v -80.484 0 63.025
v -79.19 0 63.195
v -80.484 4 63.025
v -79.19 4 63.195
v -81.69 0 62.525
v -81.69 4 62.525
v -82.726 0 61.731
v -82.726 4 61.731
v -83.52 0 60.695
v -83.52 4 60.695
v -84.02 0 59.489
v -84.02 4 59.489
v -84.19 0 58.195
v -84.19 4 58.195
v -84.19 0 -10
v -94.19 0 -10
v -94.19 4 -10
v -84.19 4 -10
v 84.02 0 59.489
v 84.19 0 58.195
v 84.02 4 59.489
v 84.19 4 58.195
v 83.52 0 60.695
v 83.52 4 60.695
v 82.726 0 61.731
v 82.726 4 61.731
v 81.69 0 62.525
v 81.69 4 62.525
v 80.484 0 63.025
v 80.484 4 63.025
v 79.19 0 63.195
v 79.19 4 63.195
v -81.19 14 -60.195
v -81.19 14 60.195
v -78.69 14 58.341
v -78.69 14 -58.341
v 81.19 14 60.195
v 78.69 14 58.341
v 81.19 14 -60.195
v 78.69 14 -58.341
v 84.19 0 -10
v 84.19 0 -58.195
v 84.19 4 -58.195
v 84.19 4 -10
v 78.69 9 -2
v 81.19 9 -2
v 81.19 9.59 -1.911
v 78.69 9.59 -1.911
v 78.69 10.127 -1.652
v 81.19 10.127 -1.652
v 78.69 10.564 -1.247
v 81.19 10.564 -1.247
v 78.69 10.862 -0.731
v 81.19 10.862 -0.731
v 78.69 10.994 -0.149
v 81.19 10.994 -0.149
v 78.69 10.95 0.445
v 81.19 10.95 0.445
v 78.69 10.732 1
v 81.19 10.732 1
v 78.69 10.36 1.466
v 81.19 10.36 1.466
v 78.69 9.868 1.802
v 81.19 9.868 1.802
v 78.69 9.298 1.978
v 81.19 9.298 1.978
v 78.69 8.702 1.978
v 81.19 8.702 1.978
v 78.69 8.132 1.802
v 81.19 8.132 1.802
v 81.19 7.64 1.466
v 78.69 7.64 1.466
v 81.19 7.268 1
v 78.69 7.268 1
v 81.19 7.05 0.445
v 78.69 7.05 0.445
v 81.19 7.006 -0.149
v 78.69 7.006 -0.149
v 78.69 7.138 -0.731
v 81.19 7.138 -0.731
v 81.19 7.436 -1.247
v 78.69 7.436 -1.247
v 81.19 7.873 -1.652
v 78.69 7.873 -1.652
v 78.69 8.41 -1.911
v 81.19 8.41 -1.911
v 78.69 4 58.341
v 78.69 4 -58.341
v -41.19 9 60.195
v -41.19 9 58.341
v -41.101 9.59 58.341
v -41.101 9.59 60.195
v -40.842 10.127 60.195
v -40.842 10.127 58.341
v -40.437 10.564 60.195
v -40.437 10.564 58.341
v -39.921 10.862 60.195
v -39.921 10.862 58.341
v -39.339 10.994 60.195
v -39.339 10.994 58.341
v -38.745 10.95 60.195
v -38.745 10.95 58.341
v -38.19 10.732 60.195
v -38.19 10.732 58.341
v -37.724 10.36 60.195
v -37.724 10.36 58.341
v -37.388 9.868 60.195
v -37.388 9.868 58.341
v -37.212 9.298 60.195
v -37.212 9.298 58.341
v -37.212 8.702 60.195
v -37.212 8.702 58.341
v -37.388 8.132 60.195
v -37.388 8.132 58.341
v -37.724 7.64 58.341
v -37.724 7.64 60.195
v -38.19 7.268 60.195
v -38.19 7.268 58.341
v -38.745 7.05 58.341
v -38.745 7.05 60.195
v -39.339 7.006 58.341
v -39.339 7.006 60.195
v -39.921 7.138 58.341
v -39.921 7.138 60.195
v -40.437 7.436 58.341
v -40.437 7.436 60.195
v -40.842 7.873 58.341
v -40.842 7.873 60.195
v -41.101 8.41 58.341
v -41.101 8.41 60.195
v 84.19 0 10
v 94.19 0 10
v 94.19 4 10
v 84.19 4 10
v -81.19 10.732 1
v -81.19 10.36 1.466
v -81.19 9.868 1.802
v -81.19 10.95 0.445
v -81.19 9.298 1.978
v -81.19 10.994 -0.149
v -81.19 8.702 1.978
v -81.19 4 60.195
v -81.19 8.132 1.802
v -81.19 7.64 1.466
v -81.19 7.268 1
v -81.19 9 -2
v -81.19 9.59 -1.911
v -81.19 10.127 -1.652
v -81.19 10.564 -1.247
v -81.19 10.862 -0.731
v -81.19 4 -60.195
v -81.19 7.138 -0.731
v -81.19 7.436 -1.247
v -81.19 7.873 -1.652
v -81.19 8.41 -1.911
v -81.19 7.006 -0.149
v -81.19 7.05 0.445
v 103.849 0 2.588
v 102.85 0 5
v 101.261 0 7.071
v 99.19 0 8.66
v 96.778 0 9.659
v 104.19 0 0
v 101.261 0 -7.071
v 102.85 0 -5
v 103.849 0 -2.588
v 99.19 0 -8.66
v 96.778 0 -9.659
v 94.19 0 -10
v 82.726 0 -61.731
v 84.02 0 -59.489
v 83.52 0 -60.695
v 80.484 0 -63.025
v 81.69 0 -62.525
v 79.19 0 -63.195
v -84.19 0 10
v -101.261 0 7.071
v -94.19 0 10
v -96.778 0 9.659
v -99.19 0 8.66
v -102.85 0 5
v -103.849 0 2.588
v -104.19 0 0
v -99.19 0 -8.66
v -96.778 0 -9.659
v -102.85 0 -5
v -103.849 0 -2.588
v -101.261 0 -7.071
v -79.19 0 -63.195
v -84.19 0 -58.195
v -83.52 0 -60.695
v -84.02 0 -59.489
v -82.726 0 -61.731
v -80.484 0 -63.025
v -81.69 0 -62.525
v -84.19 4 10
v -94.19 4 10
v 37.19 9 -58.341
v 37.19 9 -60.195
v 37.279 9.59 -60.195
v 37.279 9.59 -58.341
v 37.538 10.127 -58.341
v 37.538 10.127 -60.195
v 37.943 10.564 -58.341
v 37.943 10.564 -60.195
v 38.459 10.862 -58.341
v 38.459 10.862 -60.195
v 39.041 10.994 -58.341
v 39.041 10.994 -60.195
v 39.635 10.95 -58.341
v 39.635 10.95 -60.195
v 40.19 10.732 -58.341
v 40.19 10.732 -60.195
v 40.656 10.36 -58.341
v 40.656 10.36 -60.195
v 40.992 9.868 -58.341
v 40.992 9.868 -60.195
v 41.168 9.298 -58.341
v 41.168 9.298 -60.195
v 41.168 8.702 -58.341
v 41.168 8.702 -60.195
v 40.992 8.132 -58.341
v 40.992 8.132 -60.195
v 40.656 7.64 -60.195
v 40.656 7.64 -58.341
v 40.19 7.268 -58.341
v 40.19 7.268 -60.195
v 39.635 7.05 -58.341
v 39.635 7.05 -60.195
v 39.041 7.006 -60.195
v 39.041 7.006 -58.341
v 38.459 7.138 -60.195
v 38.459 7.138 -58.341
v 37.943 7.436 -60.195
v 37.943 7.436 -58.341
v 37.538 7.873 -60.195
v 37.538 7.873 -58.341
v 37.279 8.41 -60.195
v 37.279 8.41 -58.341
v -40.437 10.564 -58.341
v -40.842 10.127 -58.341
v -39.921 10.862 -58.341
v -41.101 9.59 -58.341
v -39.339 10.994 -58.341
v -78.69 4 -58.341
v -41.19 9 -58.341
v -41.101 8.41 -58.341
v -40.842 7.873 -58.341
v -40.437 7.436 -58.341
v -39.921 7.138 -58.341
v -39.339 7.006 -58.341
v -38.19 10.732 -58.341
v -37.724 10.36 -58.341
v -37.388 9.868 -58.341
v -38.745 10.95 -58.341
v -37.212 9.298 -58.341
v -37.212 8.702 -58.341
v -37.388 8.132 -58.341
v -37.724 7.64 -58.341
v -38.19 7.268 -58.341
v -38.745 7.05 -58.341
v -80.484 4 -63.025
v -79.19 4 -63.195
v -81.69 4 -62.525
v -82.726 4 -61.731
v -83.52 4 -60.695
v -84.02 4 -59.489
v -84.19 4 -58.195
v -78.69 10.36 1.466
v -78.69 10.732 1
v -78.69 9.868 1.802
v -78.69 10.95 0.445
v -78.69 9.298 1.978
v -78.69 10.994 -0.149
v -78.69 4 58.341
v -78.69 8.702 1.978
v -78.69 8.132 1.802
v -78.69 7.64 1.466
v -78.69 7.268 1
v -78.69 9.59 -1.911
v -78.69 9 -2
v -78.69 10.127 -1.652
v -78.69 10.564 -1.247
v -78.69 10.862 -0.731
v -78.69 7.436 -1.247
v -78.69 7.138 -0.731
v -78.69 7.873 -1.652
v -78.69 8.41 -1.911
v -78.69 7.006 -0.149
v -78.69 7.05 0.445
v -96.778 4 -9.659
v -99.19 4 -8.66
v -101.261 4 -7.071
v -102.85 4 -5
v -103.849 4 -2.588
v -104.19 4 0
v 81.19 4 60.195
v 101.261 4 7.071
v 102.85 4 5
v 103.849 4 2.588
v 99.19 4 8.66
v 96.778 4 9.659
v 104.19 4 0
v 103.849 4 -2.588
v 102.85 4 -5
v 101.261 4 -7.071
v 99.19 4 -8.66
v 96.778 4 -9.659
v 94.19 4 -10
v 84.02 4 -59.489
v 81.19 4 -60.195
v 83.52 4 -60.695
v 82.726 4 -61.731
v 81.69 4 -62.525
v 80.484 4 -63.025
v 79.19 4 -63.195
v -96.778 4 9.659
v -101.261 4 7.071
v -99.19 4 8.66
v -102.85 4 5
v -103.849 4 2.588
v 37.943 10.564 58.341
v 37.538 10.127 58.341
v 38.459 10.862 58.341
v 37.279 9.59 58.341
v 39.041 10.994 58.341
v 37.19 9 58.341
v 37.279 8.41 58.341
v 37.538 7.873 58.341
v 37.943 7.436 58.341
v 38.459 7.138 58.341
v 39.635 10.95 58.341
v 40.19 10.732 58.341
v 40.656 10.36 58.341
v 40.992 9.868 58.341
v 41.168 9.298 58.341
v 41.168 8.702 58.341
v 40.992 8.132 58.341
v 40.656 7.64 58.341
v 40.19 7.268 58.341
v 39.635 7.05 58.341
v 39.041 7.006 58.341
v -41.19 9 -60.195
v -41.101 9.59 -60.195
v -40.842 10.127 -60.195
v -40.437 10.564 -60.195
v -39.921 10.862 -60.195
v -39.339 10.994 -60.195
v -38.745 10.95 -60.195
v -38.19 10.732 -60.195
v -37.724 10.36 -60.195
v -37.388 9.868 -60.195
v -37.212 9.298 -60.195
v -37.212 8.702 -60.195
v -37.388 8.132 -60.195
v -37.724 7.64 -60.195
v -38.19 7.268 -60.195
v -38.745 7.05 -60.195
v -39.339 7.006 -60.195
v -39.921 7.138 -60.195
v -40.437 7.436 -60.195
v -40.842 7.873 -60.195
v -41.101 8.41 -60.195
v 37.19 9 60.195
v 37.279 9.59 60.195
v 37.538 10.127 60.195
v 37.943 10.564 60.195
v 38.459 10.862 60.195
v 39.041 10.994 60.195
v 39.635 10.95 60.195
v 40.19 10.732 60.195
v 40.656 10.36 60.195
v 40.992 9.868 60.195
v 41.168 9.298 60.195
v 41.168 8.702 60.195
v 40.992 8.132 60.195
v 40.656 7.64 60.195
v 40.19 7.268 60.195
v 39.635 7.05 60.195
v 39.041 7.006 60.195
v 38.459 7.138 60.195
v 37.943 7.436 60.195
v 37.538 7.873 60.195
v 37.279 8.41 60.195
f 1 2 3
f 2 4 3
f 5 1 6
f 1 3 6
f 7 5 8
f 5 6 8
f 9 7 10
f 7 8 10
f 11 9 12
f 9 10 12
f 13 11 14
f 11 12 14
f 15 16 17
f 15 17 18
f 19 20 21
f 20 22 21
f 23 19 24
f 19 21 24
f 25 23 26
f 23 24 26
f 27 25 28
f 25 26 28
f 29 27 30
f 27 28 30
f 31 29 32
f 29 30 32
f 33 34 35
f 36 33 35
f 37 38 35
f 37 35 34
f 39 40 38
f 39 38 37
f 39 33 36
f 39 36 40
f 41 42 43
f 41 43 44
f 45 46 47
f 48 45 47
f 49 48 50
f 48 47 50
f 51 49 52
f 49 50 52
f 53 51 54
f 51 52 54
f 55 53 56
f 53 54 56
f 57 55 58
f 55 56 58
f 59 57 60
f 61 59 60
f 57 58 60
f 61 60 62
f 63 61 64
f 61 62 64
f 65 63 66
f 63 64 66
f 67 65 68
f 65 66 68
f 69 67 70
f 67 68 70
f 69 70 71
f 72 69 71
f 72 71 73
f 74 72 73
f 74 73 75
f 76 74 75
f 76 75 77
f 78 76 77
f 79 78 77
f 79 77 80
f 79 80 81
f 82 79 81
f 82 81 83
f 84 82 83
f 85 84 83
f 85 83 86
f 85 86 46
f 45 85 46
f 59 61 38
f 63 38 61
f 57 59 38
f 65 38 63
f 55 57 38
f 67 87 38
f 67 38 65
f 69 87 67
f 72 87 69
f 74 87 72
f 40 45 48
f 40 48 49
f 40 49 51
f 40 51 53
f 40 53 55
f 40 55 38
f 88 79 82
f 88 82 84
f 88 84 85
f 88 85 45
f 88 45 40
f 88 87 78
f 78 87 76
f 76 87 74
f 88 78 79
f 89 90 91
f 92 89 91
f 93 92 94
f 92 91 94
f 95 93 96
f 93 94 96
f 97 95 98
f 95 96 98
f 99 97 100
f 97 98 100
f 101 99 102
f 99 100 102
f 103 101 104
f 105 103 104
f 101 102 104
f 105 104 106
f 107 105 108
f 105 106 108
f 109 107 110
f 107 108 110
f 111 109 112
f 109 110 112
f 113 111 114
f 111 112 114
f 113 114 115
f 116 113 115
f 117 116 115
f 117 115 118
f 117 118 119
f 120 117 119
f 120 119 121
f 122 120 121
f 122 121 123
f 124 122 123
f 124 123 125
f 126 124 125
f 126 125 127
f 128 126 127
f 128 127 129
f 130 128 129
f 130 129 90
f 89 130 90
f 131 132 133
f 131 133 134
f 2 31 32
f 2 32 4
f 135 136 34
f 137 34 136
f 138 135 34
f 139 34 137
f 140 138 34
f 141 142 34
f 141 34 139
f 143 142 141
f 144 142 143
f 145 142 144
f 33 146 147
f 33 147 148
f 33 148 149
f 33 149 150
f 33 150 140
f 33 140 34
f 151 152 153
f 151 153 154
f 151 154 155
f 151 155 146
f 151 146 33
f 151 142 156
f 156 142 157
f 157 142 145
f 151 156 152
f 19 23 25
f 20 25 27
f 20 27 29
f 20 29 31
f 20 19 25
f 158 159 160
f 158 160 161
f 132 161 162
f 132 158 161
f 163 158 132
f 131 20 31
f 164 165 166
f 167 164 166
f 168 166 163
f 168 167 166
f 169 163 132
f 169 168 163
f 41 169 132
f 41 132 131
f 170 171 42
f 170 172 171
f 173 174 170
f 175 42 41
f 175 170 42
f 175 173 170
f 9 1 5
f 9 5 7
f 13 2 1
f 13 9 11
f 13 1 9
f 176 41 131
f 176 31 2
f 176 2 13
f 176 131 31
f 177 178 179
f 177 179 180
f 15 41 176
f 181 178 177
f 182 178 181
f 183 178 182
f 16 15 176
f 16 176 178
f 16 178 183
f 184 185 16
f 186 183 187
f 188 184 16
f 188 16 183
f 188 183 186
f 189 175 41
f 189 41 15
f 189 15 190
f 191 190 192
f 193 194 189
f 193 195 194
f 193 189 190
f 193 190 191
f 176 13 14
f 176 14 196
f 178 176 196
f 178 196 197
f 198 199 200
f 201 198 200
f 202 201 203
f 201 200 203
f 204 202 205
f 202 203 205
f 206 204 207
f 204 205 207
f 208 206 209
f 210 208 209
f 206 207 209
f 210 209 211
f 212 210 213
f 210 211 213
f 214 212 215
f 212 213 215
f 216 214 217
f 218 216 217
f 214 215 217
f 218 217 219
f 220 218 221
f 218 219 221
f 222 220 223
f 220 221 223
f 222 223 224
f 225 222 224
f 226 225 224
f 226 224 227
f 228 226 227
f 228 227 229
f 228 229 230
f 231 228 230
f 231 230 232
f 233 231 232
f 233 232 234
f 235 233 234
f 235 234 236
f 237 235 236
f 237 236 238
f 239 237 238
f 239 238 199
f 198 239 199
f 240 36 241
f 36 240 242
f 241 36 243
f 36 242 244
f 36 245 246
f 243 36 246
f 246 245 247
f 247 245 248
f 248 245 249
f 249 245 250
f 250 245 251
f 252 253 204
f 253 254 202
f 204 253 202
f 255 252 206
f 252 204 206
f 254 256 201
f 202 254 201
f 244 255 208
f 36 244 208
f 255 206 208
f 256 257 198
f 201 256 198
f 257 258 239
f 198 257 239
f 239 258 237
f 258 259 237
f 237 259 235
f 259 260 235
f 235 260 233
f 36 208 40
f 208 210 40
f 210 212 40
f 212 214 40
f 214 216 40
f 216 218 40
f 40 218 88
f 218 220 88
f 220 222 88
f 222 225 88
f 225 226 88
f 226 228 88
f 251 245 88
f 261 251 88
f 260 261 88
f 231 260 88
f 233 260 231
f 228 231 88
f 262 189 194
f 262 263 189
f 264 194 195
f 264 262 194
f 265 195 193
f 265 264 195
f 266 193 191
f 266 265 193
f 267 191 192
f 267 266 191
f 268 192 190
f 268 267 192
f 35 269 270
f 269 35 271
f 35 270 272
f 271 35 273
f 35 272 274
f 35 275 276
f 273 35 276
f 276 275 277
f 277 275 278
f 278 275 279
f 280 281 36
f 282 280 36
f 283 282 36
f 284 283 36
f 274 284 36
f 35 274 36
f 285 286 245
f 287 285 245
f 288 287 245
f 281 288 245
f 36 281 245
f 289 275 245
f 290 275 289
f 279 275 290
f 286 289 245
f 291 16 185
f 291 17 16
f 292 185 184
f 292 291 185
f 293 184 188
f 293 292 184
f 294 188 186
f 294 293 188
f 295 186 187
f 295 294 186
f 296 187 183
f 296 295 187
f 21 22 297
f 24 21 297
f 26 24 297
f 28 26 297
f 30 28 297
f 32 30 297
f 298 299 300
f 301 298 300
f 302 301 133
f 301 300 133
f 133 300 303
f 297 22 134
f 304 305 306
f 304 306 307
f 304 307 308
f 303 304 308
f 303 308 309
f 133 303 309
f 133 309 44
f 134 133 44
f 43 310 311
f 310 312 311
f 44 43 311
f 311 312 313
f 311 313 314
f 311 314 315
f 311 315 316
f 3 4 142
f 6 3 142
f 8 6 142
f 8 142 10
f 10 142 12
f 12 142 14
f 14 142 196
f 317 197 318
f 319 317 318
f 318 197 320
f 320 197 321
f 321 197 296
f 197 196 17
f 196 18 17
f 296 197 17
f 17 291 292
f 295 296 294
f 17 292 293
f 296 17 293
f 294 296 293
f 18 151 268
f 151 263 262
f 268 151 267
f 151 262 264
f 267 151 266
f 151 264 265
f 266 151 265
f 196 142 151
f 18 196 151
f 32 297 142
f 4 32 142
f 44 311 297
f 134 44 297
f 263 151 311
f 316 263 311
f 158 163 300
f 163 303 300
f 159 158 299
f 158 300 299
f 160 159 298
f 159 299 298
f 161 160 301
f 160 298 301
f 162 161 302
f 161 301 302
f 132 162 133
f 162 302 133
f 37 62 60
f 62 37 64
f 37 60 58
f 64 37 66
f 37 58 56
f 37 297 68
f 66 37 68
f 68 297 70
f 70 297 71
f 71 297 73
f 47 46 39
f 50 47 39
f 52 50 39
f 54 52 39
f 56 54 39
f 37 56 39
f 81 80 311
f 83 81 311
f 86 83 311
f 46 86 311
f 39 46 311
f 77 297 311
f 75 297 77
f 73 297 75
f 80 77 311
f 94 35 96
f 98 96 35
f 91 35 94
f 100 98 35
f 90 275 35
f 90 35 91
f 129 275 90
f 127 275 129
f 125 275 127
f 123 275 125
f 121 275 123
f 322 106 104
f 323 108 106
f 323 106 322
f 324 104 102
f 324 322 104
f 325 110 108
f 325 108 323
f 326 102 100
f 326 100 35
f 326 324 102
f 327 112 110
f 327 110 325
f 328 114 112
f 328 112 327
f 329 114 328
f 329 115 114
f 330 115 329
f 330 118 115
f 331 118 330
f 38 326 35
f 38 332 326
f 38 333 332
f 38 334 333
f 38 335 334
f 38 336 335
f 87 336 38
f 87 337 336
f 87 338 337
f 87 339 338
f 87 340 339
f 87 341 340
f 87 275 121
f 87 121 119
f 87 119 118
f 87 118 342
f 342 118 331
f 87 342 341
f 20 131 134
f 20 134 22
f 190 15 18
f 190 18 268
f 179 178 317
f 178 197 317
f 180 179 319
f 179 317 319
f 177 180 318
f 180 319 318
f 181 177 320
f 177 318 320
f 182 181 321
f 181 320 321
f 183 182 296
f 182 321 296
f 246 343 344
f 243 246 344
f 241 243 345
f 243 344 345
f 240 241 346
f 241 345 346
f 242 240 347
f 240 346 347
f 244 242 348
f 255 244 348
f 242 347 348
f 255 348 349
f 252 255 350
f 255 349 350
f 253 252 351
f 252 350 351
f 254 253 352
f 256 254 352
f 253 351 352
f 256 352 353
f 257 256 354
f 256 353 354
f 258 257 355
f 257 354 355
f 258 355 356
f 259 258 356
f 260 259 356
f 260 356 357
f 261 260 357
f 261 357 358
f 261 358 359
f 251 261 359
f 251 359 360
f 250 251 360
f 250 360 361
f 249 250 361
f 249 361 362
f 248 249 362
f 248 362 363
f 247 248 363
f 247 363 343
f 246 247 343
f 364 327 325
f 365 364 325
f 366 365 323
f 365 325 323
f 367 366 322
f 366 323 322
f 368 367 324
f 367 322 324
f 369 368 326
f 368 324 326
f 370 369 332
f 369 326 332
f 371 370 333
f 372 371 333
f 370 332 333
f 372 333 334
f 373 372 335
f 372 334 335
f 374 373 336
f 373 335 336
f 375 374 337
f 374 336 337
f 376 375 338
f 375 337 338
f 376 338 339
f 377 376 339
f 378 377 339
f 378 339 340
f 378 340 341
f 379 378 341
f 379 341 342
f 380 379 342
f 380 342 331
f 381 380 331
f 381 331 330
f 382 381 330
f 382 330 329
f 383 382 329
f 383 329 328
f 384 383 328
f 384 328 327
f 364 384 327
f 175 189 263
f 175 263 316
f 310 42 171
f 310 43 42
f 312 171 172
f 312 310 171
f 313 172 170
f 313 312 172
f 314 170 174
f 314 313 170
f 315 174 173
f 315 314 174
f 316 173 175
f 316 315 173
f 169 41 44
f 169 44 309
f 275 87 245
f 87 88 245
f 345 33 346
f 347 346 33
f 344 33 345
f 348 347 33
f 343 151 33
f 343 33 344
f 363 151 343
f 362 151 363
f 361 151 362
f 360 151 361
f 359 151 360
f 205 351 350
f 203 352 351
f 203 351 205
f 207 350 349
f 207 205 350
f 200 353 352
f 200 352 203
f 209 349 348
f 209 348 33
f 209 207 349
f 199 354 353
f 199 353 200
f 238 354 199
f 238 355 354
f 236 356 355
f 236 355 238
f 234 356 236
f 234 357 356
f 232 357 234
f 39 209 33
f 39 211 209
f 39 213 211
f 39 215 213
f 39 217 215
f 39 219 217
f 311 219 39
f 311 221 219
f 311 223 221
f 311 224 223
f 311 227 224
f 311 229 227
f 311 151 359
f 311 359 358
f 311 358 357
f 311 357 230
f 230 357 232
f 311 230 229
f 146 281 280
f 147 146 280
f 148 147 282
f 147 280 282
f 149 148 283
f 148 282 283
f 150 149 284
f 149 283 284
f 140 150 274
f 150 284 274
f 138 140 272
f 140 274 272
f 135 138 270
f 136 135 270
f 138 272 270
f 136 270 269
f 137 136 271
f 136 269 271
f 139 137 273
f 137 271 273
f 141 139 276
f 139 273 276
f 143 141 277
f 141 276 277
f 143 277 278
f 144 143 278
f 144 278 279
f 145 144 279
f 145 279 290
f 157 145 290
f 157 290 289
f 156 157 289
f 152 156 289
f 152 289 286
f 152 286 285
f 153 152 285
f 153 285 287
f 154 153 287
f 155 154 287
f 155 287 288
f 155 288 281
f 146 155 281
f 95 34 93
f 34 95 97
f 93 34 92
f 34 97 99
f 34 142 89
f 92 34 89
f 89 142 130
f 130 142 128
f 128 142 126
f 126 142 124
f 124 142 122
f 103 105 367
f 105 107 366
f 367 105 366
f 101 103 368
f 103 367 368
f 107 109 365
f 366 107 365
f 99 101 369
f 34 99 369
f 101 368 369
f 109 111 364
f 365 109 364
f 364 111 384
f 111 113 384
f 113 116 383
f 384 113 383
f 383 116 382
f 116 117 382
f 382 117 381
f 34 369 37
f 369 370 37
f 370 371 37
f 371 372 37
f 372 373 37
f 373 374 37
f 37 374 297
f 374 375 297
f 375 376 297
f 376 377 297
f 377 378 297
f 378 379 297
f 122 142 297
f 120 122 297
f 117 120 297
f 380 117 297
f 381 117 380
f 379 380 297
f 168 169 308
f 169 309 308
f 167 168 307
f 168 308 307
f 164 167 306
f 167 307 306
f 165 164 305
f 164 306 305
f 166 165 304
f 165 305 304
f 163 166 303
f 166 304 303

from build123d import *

# Parameters (mm, degrees)
BOSS_EXTRUDE1_DEPTH = 4
SKETCH2_W           = 162.38
SKETCH2_H           = 120.39
SKETCH2_W_2         = 157.38
SKETCH2_H_2         = 116.682954798
BOSS_EXTRUDE2_DEPTH = 10
FILLET1_R           = 10
FILLET2_R           = 5
SKETCH3_R           = 2
CUT_EXTRUDE1_DEPTH  = 182
SKETCH4_R           = 2
CUT_EXTRUDE2_DEPTH  = 182


with BuildPart() as part:
    # Sketch1 → Boss-Extrude1 (new body)
    with BuildSketch(Plane(origin=(0, 0, 0), x_dir=(1, 0, 0), z_dir=(0, 1, 0))):
        Polygon((-84.19, 63.195), (84.19, 63.195), (84.19, 10), (104.19, 10), (104.19, -10), (84.19, -10), (84.19, -63.195), (-84.19, -63.195), (-84.19, -10), (-104.19, -10), (-104.19, 10), (-84.19, 10), align=None)
    extrude(amount=BOSS_EXTRUDE1_DEPTH)

    # Sketch2 → Boss-Extrude2 (add)
    with BuildSketch(Plane(origin=(0, 4, 0), x_dir=(1, 0, 0), z_dir=(0, 1, 0))):
        Rectangle(SKETCH2_W, SKETCH2_H)
        Rectangle(SKETCH2_W_2, SKETCH2_H_2, mode=Mode.SUBTRACT)
    extrude(amount=BOSS_EXTRUDE2_DEPTH)

    # Fillet1
    fillet1_edges = [part.edges().sort_by_distance(p)[0] for p in [
        (104.19, 2, -10),
        (104.19, 2, 10),
        (-104.19, 2, -10),
        (-104.19, 2, 10),
    ]]
    fillet(fillet1_edges, radius=FILLET1_R - 0.0001)  # a hair under: the kernel refuses the full size

    # Fillet2
    fillet2_edges = [part.edges().sort_by_distance(p)[0] for p in [
        (84.19, 2, 63.195),
        (-84.19, 2, 63.195),
        (-84.19, 2, -63.195),
        (84.19, 2, -63.195),
    ]]
    fillet(fillet2_edges, radius=FILLET2_R)

    # Sketch3 → Cut-Extrude1 (cut)
    with BuildSketch(Plane(origin=(81.19, 0, 0), x_dir=(0, 0, -1), z_dir=(1, 0, 0))):
        with Locations((0, 9)):
            Circle(SKETCH3_R)
    extrude(amount=-CUT_EXTRUDE1_DEPTH, mode=Mode.SUBTRACT)

    # Sketch4 → Cut-Extrude2 (cut)
    with BuildSketch(Plane(origin=(0, 0, -63.195), x_dir=(-1, 0, 0), z_dir=(0, 0, -1))):
        with Locations((39.19, 9)):
            Circle(SKETCH4_R)
        with Locations((-39.19, 9)):
            Circle(SKETCH4_R)
    extrude(amount=-CUT_EXTRUDE2_DEPTH, mode=Mode.SUBTRACT)


solid = part.part
